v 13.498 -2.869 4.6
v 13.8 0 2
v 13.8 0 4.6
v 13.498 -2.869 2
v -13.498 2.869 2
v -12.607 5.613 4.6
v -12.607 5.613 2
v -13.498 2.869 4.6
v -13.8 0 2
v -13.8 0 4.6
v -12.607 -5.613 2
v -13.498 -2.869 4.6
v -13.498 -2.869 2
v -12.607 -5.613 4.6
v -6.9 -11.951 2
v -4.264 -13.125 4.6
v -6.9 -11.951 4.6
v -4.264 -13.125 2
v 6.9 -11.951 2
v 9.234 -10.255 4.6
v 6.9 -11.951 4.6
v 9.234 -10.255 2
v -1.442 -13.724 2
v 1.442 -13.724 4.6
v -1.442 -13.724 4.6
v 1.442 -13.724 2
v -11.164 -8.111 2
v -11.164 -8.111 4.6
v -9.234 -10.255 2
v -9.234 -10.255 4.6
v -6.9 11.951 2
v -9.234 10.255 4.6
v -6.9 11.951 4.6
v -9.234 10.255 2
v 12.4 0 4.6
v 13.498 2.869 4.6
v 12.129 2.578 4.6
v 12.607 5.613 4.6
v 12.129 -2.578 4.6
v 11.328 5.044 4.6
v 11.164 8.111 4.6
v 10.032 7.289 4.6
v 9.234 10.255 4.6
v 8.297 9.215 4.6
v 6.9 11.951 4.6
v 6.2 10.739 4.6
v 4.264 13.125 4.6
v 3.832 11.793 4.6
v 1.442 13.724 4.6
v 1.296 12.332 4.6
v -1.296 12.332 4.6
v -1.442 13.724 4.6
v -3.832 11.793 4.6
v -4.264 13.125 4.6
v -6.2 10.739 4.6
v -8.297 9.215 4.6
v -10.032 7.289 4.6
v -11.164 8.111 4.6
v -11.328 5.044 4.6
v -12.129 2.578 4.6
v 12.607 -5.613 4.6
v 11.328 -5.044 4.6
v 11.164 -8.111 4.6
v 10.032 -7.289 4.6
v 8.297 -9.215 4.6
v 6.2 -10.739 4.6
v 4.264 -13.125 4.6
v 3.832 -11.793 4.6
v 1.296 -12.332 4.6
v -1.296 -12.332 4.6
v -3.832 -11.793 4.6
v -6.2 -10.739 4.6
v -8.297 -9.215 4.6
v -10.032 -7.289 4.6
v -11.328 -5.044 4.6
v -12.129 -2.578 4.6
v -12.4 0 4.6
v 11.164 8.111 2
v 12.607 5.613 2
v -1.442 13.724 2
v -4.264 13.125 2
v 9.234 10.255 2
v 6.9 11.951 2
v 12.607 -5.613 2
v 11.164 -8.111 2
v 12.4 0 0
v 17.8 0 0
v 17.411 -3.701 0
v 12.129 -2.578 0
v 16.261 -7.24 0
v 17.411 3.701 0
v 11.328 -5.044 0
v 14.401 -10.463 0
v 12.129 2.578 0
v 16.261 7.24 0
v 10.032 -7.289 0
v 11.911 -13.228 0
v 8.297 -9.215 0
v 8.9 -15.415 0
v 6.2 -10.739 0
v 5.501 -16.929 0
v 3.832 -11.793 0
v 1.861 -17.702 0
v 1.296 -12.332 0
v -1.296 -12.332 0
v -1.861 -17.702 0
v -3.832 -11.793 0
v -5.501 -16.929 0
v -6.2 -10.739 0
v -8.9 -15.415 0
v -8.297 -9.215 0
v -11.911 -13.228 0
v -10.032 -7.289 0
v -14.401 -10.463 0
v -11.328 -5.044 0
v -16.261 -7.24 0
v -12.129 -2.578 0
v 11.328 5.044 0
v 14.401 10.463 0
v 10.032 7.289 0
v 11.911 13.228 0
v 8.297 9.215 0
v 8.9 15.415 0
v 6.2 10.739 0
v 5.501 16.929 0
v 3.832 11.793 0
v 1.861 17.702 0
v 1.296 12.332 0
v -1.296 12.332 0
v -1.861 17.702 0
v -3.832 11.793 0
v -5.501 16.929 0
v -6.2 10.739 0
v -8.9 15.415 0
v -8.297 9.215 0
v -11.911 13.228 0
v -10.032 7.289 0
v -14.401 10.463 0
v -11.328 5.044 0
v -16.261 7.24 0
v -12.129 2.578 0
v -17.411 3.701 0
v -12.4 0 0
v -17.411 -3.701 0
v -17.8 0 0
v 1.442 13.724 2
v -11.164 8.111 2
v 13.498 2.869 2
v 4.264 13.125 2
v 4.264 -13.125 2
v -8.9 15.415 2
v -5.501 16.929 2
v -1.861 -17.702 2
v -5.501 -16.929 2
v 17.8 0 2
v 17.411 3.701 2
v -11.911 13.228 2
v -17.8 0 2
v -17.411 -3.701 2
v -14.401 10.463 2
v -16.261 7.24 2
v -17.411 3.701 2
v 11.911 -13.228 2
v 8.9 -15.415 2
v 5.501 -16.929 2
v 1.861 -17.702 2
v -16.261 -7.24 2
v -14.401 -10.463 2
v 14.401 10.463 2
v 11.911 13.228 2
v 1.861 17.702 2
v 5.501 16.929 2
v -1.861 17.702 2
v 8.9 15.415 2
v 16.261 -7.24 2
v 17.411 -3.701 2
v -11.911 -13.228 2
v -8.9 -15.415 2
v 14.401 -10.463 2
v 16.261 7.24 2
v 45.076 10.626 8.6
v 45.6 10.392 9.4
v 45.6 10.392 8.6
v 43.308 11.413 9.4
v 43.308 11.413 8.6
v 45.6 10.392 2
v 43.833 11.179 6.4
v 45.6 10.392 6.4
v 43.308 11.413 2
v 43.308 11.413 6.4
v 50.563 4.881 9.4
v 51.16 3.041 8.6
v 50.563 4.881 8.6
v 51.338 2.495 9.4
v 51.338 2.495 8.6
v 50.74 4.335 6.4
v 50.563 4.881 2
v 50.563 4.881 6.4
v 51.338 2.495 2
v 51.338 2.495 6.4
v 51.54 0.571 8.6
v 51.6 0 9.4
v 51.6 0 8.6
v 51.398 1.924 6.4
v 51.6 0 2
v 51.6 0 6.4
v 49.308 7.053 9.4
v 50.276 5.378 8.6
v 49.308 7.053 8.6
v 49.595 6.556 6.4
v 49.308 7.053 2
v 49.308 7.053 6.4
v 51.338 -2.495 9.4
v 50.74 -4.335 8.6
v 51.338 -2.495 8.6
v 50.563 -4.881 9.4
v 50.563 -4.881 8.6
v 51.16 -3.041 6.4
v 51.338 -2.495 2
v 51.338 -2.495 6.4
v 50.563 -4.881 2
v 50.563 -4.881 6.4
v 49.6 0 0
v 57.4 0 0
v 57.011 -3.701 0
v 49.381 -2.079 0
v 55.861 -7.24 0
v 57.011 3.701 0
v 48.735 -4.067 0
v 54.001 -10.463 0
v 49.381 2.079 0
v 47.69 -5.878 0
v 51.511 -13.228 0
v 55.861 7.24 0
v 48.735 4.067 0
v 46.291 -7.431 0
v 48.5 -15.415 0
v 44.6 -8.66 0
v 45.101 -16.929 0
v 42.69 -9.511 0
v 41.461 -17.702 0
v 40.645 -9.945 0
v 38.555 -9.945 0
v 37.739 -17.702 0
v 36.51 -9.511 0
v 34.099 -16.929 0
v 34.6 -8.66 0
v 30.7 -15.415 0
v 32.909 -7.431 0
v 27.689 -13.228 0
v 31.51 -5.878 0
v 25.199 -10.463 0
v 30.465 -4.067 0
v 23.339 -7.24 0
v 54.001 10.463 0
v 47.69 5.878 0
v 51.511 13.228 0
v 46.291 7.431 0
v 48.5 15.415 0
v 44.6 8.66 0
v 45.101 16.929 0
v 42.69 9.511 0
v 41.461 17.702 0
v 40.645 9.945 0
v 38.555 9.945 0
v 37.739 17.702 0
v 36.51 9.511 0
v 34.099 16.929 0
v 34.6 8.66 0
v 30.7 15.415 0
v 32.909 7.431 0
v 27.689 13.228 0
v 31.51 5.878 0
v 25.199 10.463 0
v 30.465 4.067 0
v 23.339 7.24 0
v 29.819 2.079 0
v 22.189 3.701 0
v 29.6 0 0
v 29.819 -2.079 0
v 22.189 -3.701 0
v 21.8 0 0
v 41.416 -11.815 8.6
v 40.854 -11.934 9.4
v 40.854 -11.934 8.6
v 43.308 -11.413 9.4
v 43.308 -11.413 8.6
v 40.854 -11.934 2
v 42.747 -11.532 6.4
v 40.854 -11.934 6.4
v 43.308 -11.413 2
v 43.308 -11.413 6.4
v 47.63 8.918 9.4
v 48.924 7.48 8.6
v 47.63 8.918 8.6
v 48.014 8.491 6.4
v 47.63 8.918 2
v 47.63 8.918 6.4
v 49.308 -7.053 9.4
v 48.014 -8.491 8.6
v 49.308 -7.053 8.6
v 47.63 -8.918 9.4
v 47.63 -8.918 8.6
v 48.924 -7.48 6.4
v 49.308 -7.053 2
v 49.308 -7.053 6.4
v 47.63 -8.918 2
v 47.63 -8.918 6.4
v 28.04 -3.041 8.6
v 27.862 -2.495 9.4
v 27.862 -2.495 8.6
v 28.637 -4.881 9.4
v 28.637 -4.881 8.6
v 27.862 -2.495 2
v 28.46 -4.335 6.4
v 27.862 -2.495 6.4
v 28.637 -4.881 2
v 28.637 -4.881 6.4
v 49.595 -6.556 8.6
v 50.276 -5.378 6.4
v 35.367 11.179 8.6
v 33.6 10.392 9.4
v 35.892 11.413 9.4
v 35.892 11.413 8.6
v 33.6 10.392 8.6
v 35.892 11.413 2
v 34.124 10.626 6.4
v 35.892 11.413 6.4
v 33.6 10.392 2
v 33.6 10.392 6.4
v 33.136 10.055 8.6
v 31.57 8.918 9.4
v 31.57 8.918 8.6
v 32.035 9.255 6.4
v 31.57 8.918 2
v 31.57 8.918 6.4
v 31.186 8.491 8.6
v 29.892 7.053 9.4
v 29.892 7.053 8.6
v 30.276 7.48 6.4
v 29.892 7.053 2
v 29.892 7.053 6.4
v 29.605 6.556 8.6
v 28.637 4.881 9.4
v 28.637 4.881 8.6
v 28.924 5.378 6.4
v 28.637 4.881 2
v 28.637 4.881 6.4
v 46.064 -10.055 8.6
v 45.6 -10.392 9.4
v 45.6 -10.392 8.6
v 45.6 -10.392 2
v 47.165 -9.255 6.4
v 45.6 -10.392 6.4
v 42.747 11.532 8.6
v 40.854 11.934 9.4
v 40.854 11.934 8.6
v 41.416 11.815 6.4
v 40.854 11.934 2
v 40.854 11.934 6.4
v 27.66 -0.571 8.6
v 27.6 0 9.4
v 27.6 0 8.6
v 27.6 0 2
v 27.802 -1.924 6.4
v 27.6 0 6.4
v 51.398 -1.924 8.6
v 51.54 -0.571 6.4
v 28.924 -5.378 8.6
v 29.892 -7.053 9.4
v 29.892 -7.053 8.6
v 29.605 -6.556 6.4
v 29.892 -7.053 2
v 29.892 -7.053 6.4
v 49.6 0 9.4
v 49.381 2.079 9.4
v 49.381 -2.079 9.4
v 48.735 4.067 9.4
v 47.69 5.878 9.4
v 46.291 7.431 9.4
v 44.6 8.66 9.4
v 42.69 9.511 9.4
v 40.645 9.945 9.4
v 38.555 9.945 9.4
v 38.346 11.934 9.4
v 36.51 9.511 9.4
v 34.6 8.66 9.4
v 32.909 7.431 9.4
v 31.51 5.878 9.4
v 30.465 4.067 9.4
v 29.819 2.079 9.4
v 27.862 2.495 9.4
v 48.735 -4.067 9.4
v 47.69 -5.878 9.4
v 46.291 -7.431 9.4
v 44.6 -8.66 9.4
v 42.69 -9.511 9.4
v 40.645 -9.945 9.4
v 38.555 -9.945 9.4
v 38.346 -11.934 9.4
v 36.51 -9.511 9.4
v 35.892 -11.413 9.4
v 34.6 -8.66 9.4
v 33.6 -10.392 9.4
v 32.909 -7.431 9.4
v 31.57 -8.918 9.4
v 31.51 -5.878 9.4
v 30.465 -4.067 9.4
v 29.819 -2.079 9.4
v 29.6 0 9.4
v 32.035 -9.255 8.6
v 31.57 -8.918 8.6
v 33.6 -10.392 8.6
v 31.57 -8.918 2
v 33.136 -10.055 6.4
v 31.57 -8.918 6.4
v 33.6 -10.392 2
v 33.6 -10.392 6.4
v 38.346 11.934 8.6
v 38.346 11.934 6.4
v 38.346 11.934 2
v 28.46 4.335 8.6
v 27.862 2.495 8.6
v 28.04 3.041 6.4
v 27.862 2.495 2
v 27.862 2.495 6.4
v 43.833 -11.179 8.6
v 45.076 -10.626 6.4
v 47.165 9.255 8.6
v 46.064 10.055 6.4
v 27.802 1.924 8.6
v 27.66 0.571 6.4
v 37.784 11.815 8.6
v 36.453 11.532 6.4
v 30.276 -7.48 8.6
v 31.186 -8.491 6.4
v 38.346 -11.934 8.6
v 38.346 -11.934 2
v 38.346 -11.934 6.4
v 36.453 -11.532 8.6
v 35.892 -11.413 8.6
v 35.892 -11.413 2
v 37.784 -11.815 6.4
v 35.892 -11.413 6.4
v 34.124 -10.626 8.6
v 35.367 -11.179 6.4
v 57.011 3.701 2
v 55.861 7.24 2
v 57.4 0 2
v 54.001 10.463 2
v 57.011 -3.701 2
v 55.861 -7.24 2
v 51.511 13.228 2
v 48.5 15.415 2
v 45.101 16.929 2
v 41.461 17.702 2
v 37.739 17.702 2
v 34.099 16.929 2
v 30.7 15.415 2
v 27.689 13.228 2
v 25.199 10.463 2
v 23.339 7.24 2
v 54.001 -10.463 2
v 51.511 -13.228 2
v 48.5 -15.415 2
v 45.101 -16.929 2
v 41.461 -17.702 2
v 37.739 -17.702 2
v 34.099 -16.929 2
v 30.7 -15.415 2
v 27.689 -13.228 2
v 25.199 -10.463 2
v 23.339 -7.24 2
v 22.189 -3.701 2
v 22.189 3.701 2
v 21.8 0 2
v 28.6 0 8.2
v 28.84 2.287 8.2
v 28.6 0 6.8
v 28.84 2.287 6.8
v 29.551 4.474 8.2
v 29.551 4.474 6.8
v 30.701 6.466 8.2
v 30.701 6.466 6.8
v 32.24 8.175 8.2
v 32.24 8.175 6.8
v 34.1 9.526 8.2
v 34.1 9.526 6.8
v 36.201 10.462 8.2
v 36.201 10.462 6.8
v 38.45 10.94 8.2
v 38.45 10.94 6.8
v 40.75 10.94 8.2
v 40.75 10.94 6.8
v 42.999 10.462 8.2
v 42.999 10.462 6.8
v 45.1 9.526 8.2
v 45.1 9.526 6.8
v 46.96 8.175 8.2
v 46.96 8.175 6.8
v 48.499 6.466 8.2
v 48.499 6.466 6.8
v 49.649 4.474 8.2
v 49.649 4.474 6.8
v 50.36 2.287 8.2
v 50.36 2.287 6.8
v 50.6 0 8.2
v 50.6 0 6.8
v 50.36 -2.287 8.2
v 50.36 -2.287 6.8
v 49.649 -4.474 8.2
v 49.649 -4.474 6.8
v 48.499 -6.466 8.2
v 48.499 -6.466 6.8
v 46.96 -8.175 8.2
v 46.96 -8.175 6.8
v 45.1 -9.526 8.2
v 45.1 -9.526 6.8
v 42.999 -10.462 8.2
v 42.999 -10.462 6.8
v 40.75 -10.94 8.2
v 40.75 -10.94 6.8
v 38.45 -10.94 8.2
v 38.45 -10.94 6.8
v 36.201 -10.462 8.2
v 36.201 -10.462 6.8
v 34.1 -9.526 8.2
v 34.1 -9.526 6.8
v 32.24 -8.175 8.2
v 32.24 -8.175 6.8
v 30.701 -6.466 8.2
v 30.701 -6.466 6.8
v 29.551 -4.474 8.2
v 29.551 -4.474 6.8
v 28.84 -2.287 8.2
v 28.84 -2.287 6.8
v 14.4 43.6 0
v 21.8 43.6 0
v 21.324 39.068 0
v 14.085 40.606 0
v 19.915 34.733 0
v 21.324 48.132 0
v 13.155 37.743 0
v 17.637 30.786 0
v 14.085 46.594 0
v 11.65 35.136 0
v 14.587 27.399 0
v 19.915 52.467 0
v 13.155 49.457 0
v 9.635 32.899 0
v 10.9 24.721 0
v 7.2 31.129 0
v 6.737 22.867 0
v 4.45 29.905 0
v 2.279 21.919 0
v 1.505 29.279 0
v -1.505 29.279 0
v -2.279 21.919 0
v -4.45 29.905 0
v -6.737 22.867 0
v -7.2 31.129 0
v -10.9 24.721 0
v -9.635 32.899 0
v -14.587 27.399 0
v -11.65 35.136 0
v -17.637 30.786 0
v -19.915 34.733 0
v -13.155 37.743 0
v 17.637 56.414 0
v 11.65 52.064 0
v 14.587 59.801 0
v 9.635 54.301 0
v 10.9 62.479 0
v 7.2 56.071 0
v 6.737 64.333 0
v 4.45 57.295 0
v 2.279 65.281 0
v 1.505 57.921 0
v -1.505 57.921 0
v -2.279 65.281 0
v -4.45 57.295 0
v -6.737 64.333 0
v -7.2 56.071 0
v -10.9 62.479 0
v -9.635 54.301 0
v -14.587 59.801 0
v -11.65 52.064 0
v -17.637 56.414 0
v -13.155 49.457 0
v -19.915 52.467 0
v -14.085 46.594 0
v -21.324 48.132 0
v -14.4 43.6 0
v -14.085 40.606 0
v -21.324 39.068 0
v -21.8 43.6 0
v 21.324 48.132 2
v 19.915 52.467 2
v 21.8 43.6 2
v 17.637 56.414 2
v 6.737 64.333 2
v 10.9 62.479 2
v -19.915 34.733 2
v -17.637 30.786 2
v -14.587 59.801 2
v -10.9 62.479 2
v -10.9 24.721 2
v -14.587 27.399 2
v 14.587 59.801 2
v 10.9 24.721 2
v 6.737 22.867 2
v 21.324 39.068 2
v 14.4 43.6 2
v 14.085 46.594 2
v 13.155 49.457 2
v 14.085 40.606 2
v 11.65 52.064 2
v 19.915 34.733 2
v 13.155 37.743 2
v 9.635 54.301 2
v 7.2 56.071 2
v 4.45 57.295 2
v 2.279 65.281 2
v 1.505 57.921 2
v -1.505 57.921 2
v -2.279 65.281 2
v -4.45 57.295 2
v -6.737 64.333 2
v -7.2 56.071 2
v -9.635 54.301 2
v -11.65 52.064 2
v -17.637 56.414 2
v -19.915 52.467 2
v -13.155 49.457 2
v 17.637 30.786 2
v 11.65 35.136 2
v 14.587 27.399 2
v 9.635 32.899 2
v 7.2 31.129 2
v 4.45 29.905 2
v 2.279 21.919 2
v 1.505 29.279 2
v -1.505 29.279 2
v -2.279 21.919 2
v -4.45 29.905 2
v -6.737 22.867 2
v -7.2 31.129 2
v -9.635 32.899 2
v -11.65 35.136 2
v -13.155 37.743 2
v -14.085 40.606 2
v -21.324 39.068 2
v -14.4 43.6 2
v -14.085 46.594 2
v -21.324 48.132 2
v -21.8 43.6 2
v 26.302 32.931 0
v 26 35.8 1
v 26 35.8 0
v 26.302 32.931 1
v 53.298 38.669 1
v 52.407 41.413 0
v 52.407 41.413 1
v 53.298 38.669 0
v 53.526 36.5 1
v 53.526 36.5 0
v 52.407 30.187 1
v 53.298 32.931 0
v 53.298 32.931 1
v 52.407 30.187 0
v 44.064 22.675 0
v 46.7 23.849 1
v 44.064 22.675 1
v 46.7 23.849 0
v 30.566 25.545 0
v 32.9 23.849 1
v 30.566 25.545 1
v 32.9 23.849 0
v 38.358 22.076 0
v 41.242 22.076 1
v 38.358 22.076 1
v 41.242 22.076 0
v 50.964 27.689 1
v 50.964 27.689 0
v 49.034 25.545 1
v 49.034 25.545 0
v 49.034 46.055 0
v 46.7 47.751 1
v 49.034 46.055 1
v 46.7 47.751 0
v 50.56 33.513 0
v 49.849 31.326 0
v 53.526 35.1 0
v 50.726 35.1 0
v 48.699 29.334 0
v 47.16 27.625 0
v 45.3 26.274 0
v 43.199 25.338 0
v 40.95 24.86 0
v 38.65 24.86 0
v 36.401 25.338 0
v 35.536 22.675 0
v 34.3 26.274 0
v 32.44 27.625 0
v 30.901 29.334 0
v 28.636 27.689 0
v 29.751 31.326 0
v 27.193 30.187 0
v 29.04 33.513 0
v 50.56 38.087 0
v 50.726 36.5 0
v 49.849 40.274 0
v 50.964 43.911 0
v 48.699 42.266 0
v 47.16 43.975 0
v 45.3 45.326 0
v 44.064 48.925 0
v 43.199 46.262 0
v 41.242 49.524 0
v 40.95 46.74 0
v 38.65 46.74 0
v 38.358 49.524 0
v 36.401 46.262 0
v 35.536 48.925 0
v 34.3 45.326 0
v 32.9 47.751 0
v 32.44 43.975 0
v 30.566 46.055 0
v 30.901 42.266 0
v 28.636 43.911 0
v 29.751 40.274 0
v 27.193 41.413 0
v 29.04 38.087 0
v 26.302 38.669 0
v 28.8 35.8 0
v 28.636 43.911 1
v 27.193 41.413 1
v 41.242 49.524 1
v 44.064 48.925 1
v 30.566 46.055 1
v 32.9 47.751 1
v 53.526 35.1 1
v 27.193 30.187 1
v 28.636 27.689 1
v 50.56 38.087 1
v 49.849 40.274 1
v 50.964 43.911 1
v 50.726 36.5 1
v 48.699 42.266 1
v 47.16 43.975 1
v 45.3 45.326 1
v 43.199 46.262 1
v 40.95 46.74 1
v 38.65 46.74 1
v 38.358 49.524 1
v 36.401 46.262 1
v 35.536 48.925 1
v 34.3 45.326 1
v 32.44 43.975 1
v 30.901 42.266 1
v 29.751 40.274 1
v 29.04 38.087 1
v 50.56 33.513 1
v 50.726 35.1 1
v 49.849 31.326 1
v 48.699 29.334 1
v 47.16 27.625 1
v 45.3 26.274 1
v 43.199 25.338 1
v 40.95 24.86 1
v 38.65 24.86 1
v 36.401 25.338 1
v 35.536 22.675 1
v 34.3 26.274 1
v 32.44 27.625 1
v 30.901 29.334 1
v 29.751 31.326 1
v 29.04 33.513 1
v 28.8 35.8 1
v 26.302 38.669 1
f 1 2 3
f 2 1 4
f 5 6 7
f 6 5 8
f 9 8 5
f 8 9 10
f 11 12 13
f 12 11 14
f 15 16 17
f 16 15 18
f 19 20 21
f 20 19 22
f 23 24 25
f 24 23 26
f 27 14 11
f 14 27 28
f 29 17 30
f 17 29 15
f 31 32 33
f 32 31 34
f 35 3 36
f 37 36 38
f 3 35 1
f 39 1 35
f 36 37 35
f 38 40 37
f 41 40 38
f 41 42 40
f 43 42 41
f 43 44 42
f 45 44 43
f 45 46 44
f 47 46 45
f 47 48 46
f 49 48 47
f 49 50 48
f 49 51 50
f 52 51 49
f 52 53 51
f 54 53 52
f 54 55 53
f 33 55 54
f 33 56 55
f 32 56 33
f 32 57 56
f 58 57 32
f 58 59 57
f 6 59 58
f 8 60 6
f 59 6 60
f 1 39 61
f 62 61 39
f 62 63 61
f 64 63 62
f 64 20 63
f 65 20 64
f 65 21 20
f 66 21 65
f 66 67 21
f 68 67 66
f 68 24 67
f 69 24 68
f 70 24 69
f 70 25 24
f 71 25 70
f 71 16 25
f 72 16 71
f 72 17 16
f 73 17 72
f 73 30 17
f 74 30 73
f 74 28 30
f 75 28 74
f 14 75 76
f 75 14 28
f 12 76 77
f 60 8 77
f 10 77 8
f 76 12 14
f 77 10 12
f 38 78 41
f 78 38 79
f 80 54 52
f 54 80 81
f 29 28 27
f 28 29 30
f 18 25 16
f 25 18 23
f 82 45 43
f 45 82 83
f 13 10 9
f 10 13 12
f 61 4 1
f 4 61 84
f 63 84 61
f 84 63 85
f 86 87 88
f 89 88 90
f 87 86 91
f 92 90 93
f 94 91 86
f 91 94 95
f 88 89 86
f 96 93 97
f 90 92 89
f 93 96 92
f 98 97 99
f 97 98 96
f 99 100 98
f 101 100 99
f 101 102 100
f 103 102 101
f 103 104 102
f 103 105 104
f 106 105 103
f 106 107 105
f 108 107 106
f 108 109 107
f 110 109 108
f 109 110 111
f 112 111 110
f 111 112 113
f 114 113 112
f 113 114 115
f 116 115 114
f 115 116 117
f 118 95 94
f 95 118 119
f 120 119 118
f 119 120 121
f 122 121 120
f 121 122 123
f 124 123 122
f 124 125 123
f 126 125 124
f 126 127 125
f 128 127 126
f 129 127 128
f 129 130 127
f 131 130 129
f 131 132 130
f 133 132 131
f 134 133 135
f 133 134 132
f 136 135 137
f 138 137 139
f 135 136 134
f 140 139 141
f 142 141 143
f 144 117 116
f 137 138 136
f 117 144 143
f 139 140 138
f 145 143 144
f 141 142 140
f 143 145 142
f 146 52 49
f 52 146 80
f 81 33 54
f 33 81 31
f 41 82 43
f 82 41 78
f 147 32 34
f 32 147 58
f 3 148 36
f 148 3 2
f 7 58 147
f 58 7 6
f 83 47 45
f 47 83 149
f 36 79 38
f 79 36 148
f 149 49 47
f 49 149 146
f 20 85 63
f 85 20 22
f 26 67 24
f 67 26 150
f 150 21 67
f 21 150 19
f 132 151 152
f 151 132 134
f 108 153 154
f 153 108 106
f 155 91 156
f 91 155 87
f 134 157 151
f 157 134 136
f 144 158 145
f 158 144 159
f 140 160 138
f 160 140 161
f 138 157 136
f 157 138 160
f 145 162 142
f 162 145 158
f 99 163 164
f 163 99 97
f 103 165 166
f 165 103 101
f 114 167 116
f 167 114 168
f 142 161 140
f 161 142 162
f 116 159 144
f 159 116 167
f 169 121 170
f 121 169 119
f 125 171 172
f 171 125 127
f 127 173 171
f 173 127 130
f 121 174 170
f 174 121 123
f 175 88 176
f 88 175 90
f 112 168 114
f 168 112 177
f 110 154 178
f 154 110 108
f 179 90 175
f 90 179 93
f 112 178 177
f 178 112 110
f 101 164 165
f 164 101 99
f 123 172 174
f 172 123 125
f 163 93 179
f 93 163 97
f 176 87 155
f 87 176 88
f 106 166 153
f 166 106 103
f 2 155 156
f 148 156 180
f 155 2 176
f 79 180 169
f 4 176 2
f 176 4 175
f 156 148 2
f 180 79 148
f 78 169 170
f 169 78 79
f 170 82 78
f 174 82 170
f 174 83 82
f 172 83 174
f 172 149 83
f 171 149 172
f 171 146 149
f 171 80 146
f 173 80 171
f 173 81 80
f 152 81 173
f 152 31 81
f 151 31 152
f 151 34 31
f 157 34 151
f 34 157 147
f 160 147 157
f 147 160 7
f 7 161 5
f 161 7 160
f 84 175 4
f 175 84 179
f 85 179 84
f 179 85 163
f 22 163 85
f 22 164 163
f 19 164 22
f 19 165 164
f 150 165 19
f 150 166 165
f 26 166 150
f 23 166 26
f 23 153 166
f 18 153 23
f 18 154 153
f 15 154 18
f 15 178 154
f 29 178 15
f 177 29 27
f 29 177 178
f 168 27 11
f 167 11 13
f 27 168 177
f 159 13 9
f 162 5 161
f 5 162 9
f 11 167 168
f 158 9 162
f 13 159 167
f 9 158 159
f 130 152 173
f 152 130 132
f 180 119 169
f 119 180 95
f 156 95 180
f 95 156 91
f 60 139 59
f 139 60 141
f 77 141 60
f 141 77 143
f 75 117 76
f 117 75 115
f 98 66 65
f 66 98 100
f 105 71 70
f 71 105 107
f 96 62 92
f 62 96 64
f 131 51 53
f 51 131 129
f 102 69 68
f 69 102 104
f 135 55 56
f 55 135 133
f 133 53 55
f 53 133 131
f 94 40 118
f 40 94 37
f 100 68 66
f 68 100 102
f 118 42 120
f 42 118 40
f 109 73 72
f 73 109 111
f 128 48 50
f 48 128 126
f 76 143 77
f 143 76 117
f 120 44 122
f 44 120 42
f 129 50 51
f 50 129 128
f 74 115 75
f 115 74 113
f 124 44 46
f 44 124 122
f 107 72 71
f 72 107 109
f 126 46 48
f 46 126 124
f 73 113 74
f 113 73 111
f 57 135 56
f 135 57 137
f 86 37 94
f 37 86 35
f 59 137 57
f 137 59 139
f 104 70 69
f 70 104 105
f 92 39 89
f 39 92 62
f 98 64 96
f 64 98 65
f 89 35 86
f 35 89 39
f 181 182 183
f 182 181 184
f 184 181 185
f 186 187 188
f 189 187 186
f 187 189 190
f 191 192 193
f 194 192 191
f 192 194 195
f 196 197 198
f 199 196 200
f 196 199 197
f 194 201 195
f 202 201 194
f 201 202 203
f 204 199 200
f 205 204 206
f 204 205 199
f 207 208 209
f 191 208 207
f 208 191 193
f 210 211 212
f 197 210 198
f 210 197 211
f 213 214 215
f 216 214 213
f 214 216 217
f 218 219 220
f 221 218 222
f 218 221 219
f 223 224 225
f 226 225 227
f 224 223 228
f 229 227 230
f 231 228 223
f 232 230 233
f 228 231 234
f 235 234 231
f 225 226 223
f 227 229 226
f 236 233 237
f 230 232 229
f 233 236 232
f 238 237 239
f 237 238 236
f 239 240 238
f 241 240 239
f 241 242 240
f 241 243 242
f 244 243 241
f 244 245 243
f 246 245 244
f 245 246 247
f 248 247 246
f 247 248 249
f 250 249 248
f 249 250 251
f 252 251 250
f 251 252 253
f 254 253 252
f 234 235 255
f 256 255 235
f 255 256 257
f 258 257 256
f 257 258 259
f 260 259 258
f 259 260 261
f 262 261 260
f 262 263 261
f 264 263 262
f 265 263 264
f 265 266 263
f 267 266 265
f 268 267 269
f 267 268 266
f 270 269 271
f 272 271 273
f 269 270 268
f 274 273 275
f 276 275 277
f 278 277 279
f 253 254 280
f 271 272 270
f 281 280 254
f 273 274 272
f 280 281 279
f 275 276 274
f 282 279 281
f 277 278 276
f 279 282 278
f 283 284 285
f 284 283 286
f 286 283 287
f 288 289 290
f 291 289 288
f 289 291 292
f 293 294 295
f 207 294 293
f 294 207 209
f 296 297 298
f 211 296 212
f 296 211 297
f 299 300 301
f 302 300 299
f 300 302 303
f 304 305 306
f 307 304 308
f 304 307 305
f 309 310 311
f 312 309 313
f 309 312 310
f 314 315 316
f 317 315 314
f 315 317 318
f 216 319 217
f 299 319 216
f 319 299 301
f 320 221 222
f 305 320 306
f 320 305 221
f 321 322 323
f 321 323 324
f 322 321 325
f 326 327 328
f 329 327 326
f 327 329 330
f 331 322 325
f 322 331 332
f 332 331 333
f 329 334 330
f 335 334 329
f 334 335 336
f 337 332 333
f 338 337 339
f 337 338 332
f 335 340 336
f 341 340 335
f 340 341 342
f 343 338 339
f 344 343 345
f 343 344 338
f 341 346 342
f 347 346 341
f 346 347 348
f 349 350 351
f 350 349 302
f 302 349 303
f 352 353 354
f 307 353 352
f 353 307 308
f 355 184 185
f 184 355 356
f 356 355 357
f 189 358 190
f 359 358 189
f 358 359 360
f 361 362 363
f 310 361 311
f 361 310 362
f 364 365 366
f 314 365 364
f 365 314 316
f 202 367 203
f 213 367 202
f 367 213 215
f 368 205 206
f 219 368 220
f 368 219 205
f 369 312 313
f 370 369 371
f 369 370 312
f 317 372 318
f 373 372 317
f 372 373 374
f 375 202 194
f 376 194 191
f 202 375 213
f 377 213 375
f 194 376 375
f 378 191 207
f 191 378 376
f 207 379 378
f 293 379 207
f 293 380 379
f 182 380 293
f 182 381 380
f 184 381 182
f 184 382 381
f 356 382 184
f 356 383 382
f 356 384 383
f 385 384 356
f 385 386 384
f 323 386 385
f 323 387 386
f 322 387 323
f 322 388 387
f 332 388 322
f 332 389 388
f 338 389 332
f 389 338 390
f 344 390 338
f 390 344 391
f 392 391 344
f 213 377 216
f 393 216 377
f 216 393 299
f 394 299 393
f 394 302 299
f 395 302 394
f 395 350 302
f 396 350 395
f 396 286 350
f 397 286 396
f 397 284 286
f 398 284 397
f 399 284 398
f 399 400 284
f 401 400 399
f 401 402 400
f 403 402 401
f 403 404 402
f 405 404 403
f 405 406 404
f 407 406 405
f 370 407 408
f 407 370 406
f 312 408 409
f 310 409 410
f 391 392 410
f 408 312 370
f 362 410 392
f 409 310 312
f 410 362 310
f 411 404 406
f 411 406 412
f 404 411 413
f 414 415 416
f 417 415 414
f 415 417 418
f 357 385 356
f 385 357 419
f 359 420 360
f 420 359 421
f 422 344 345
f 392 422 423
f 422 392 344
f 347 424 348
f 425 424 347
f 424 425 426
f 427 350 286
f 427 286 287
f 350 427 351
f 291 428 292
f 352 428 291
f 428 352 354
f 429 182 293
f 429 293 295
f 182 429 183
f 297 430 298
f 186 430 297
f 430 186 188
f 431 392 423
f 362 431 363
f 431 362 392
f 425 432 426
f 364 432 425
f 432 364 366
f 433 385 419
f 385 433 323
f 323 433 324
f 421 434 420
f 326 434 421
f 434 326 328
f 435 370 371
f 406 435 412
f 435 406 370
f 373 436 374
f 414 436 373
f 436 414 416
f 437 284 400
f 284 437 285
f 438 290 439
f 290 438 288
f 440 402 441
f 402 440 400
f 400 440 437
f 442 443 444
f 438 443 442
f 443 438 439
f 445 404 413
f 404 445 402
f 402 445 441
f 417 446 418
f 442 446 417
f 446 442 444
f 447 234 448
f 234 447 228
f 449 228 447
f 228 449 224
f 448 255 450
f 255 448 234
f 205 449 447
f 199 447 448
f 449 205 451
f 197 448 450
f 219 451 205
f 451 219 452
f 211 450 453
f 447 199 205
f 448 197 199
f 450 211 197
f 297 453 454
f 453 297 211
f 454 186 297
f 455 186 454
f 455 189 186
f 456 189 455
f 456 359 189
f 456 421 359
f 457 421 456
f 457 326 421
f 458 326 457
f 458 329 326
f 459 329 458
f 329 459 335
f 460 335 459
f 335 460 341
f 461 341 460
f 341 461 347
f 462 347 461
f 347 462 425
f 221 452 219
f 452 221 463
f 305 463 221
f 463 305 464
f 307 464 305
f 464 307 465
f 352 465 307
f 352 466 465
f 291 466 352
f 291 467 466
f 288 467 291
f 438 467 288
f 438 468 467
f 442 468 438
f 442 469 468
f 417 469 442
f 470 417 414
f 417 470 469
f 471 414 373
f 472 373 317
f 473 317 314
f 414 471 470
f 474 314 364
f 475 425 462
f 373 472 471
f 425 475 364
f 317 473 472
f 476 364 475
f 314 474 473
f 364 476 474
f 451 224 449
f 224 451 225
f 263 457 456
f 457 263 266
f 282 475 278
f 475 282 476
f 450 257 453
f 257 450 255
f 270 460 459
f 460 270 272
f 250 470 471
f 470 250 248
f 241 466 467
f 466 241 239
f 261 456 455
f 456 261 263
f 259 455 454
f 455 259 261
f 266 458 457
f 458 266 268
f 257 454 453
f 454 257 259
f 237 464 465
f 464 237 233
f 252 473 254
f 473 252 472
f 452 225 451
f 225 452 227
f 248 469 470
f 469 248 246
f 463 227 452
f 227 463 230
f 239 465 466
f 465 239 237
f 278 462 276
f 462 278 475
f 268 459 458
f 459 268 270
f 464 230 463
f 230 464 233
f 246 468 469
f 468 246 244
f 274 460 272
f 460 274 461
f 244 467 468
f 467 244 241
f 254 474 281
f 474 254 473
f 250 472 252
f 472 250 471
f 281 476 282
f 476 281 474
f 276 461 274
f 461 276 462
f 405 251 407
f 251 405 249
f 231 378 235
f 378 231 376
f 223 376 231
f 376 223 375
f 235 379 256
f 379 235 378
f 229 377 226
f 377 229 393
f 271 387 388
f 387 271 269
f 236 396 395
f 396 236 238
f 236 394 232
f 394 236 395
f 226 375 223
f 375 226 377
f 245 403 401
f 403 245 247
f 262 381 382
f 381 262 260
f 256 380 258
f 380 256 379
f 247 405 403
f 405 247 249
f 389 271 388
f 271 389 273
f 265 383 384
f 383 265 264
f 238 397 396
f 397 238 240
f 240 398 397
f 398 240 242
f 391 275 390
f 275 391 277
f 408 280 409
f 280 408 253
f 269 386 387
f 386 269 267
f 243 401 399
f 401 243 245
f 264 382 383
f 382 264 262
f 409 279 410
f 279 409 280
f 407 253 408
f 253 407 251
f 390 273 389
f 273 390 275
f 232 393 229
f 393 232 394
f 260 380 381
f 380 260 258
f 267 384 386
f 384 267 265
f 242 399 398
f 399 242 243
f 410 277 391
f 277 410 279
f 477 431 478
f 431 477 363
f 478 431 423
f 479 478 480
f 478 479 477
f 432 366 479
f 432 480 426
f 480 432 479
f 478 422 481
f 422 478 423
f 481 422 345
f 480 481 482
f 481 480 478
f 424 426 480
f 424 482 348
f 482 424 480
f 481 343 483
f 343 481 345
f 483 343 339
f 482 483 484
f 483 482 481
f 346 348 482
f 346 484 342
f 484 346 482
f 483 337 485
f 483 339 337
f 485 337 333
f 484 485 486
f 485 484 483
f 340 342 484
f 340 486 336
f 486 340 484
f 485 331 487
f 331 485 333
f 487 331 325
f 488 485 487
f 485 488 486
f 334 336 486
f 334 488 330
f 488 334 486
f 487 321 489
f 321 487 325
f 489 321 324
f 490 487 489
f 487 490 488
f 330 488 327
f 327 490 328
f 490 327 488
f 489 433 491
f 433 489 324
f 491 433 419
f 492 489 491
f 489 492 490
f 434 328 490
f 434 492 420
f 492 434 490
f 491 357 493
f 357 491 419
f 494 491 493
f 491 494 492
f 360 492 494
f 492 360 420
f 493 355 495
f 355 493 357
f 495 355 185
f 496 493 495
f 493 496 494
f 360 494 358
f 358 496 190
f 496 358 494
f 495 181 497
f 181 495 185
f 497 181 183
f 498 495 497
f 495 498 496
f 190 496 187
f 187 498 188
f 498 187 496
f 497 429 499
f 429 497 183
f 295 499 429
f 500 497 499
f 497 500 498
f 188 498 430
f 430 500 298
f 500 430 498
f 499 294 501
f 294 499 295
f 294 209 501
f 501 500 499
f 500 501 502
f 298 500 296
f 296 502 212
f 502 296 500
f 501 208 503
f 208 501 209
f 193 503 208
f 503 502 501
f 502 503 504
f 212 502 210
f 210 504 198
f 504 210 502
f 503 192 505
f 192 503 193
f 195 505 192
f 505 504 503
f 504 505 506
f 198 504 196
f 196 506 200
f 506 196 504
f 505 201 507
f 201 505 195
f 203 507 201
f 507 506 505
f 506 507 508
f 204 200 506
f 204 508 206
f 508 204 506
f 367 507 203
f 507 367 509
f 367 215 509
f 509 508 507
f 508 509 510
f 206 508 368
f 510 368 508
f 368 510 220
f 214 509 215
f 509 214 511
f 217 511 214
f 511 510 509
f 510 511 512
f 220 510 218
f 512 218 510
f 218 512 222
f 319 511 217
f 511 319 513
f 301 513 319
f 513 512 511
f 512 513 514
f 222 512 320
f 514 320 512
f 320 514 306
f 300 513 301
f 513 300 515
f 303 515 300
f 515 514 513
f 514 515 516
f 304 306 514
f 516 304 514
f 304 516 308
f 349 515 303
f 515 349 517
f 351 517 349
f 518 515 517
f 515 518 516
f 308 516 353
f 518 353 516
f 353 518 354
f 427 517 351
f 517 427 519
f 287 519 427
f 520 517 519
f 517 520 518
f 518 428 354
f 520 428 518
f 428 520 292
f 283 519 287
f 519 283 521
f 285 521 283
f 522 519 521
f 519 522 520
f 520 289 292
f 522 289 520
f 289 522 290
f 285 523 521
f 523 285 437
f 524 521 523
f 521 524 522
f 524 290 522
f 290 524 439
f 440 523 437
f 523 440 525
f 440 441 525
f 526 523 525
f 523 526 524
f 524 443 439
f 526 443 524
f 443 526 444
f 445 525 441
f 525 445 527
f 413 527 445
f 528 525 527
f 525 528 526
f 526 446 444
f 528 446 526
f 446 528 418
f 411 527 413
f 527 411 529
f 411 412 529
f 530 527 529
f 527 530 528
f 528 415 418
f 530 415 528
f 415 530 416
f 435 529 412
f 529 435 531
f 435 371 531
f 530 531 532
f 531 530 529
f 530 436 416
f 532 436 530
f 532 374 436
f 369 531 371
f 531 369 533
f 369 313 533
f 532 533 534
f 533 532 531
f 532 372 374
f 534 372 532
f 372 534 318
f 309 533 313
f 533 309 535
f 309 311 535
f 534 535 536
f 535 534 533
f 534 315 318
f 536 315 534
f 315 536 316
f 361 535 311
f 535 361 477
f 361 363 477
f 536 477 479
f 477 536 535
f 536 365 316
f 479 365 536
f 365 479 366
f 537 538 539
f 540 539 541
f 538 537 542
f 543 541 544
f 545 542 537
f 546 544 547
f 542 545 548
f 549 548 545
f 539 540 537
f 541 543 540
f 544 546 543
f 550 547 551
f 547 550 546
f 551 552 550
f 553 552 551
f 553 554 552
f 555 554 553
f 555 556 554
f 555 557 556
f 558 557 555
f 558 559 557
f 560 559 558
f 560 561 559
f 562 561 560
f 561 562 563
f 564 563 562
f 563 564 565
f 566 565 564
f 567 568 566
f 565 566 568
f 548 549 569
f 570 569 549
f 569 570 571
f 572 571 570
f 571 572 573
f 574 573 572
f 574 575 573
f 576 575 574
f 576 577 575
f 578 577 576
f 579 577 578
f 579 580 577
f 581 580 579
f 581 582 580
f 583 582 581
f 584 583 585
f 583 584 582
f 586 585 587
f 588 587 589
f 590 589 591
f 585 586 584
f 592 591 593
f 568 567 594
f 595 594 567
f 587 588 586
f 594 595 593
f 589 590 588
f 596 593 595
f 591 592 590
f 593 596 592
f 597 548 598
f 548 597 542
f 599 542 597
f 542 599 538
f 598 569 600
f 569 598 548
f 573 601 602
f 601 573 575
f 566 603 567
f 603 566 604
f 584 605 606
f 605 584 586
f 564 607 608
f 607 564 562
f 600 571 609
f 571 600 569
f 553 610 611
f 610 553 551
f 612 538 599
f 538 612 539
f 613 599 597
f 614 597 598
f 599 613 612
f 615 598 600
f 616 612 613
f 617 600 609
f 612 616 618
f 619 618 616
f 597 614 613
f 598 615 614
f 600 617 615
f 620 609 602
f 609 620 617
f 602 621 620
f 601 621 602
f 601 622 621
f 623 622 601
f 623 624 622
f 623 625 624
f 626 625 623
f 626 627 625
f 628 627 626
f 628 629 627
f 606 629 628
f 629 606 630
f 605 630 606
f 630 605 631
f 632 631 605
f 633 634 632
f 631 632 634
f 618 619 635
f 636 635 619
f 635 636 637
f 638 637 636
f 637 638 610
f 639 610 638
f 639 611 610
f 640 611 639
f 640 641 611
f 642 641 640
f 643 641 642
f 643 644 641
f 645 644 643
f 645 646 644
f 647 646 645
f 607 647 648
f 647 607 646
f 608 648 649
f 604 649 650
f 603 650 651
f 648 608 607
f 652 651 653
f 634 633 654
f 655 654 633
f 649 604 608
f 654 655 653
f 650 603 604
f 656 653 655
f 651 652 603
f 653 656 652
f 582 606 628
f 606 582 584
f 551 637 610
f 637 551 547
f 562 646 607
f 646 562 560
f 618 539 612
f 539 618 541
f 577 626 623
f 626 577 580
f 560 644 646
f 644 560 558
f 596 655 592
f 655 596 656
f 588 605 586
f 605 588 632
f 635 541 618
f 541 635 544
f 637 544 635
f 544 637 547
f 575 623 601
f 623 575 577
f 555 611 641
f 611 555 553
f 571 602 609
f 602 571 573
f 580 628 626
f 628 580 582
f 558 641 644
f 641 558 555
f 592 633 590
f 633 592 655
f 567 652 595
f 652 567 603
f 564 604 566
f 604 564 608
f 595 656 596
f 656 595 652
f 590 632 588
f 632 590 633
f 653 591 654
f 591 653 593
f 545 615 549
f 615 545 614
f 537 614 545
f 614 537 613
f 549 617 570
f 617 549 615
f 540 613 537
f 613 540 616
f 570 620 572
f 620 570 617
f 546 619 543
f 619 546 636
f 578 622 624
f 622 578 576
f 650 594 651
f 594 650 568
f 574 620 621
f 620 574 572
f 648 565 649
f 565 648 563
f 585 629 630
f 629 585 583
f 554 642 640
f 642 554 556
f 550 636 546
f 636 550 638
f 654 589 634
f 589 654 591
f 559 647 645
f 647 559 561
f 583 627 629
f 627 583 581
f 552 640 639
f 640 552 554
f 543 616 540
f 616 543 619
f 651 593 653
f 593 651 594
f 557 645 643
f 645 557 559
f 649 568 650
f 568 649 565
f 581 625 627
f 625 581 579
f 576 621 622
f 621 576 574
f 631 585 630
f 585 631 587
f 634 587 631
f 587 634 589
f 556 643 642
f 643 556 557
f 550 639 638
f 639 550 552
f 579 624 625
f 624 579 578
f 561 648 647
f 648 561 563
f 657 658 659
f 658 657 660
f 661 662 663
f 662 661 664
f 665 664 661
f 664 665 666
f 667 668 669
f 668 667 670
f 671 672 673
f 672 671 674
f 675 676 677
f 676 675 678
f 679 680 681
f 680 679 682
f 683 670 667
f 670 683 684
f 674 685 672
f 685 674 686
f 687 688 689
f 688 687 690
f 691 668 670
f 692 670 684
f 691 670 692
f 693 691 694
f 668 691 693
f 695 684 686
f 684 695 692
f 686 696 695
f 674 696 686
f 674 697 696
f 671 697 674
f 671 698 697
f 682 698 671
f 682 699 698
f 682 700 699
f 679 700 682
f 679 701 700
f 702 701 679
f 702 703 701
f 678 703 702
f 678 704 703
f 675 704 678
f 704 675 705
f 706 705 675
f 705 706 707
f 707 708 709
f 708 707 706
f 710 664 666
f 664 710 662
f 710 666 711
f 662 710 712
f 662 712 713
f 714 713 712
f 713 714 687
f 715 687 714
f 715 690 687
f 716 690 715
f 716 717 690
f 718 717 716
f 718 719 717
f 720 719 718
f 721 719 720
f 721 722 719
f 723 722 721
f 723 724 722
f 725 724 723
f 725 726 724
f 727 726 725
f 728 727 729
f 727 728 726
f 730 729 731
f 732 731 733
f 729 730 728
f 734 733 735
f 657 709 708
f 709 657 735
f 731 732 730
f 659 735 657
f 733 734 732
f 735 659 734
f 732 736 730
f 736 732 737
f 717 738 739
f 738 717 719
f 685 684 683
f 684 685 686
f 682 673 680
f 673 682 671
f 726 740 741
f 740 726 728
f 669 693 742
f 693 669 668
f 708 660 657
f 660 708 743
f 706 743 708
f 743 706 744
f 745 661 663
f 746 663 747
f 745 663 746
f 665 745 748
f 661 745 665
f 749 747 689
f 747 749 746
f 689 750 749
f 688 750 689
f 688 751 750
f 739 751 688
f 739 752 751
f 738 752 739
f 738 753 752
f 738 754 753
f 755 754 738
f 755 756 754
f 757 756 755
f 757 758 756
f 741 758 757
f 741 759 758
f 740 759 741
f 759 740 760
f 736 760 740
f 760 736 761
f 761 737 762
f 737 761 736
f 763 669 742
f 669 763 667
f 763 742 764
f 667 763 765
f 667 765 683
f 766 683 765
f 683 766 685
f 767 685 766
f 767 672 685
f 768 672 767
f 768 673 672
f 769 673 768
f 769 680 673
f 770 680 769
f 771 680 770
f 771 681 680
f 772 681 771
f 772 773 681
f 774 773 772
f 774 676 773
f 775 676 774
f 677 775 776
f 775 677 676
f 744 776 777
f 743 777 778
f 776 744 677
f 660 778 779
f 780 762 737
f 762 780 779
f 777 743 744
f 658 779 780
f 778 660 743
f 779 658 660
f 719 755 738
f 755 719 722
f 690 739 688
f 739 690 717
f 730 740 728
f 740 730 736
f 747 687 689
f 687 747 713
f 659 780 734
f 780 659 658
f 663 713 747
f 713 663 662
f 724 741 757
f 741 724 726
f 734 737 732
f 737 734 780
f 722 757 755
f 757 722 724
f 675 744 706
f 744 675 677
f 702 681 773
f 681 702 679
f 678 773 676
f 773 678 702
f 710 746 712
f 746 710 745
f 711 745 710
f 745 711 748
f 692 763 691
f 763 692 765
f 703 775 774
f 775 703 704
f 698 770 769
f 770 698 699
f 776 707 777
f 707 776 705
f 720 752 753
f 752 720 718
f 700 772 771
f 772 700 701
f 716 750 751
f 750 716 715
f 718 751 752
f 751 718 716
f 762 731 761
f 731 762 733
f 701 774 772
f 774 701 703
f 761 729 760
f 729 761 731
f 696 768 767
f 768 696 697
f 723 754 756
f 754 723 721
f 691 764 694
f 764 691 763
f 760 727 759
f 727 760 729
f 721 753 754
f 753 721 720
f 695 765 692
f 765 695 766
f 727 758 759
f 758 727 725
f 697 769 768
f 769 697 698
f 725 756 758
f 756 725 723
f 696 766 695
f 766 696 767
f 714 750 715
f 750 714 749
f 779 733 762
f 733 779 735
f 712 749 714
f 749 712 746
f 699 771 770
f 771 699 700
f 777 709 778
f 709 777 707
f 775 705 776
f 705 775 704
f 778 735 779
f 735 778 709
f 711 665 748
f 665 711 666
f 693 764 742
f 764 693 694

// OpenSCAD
// <senorjp@gmail.com> December 2017
//
// Simple bearing with hollow center
//

inner_hole_r = 10;
inner_shell_wall = 2;
outer_shell_wall = inner_shell_wall/2;
shell_t = 2; 
flange_w = shell_t*2;
inner_outer_tolerance = .8;
journal_t = 2;
journal_tolerance = 1.2;
journal_tolerance_z = .6;

retainer_t = 1;
retainer_d = inner_shell_wall/2;
retainer_w = retainer_d*2+inner_outer_tolerance;
retainer_tolerance=.4;

shell_r = inner_hole_r + inner_shell_wall + outer_shell_wall + inner_outer_tolerance + flange_w ;
inner_shell_h = journal_t + shell_t*2 + retainer_t*2 + journal_tolerance_z + retainer_tolerance*2;
outer_shell_h = journal_t + shell_t + journal_tolerance_z;

module trapezoid_groove(
    d = 20,
    belt_width=2,
    slope=.5,
    ){
        inside_corner=belt_width/2;
        outside_corner_x=
            inside_corner
            +belt_width*4;
        outside_corner_y=
            inside_corner 
            + outside_corner_x*slope;
        
        rotate_extrude()
        translate([d/2,0,0])
        polygon(points=[
            [0,-inside_corner],[0,inside_corner],
            [outside_corner_x,outside_corner_y],
            [outside_corner_x,-outside_corner_y],
        ]);
}

module center_hole(r=inner_hole_r, h=inner_shell_h*3) {
      cylinder(r=r, h=h, center=true);  
}

module retainer_slot(r=inner_hole_r+inner_shell_wall-retainer_d, h=retainer_t+retainer_tolerance) {
    trapezoid_groove(
        d = r*2,
        belt_width=h,
        slope=.4
    );
}

module retainer_ring(r=inner_hole_r+inner_shell_wall-retainer_d, h=retainer_t) {
    difference() {
        cylinder(r=r+retainer_w, h=h, center=true);  
        cylinder(r=r, h=h*2, center=true);
        translate([r+retainer_w/2,0,0])  
            cube([retainer_d*4,retainer_w/2,retainer_t*2], center=true);
    }
}

module translate_retainer() {
        translate([0,0,shell_t*2+journal_t+journal_tolerance_z+retainer_tolerance+retainer_t/2])
        children();
}


module inner_shell() {
    //translate([0,0,inner_shell_h/2])
    difference() {
        union() {
            cylinder(r=inner_hole_r+inner_shell_wall, h=inner_shell_h);
            //translate([0,0,-inner_shell_h/2+shell_t/2])
           cylinder(r=shell_r, h=shell_t);
        } 
        
        center_hole(r=inner_hole_r);
        translate_retainer()
        retainer_slot();
    }
}

module outer_shell_hole(r=inner_hole_r+inner_shell_wall+inner_outer_tolerance/2, h=60) {
      cylinder(r=r, h=h, center=true);  
}

module outer_shell() {
    translate([0,0,-outer_shell_h/2])
    difference() {
        union() {
            cylinder(r=inner_hole_r+inner_shell_wall+inner_outer_tolerance+outer_shell_wall, h=outer_shell_h, center=true);
            translate([0,0,outer_shell_h/2-shell_t/2])
           cylinder(r=shell_r, h=shell_t, center=true);
        } 
        
        outer_shell_hole();
    }
}

module journal_hole(r=inner_hole_r+inner_shell_wall+outer_shell_wall+journal_tolerance/2+inner_outer_tolerance, h=60) {
      cylinder(r=r, h=h, center=true);  
}

module journal(r = shell_r+flange_w, t = journal_t) {
    difference() {
    cylinder (r=r, h = t, center=true);
        journal_hole();
    }
}

module hollow_bearing_assembly() {
//intersection() {
translate([0,0,shell_t+journal_t/2+journal_tolerance_z/2])
outer_shell();

    translate([0,0,-shell_t-journal_t/2-journal_tolerance_z/2]) {
    inner_shell();
   translate_retainer()
retainer_ring();
}
    

journal();
//}

}
//hollow_bearing_assembly();


module hollow_bearing_print_all() {
translate([0,0,0])
    rotate(180, [0,1,0])
        outer_shell();
translate([shell_r*2+4,0,0]) 
    inner_shell();
    
translate([0,shell_r*2+flange_w*2,journal_t/2])
    journal();
translate([shell_r+flange_w*3+inner_hole_r,shell_r+flange_w*2+inner_hole_r,retainer_t/2])
    retainer_ring();
    
}


hollow_bearing_print_all();
